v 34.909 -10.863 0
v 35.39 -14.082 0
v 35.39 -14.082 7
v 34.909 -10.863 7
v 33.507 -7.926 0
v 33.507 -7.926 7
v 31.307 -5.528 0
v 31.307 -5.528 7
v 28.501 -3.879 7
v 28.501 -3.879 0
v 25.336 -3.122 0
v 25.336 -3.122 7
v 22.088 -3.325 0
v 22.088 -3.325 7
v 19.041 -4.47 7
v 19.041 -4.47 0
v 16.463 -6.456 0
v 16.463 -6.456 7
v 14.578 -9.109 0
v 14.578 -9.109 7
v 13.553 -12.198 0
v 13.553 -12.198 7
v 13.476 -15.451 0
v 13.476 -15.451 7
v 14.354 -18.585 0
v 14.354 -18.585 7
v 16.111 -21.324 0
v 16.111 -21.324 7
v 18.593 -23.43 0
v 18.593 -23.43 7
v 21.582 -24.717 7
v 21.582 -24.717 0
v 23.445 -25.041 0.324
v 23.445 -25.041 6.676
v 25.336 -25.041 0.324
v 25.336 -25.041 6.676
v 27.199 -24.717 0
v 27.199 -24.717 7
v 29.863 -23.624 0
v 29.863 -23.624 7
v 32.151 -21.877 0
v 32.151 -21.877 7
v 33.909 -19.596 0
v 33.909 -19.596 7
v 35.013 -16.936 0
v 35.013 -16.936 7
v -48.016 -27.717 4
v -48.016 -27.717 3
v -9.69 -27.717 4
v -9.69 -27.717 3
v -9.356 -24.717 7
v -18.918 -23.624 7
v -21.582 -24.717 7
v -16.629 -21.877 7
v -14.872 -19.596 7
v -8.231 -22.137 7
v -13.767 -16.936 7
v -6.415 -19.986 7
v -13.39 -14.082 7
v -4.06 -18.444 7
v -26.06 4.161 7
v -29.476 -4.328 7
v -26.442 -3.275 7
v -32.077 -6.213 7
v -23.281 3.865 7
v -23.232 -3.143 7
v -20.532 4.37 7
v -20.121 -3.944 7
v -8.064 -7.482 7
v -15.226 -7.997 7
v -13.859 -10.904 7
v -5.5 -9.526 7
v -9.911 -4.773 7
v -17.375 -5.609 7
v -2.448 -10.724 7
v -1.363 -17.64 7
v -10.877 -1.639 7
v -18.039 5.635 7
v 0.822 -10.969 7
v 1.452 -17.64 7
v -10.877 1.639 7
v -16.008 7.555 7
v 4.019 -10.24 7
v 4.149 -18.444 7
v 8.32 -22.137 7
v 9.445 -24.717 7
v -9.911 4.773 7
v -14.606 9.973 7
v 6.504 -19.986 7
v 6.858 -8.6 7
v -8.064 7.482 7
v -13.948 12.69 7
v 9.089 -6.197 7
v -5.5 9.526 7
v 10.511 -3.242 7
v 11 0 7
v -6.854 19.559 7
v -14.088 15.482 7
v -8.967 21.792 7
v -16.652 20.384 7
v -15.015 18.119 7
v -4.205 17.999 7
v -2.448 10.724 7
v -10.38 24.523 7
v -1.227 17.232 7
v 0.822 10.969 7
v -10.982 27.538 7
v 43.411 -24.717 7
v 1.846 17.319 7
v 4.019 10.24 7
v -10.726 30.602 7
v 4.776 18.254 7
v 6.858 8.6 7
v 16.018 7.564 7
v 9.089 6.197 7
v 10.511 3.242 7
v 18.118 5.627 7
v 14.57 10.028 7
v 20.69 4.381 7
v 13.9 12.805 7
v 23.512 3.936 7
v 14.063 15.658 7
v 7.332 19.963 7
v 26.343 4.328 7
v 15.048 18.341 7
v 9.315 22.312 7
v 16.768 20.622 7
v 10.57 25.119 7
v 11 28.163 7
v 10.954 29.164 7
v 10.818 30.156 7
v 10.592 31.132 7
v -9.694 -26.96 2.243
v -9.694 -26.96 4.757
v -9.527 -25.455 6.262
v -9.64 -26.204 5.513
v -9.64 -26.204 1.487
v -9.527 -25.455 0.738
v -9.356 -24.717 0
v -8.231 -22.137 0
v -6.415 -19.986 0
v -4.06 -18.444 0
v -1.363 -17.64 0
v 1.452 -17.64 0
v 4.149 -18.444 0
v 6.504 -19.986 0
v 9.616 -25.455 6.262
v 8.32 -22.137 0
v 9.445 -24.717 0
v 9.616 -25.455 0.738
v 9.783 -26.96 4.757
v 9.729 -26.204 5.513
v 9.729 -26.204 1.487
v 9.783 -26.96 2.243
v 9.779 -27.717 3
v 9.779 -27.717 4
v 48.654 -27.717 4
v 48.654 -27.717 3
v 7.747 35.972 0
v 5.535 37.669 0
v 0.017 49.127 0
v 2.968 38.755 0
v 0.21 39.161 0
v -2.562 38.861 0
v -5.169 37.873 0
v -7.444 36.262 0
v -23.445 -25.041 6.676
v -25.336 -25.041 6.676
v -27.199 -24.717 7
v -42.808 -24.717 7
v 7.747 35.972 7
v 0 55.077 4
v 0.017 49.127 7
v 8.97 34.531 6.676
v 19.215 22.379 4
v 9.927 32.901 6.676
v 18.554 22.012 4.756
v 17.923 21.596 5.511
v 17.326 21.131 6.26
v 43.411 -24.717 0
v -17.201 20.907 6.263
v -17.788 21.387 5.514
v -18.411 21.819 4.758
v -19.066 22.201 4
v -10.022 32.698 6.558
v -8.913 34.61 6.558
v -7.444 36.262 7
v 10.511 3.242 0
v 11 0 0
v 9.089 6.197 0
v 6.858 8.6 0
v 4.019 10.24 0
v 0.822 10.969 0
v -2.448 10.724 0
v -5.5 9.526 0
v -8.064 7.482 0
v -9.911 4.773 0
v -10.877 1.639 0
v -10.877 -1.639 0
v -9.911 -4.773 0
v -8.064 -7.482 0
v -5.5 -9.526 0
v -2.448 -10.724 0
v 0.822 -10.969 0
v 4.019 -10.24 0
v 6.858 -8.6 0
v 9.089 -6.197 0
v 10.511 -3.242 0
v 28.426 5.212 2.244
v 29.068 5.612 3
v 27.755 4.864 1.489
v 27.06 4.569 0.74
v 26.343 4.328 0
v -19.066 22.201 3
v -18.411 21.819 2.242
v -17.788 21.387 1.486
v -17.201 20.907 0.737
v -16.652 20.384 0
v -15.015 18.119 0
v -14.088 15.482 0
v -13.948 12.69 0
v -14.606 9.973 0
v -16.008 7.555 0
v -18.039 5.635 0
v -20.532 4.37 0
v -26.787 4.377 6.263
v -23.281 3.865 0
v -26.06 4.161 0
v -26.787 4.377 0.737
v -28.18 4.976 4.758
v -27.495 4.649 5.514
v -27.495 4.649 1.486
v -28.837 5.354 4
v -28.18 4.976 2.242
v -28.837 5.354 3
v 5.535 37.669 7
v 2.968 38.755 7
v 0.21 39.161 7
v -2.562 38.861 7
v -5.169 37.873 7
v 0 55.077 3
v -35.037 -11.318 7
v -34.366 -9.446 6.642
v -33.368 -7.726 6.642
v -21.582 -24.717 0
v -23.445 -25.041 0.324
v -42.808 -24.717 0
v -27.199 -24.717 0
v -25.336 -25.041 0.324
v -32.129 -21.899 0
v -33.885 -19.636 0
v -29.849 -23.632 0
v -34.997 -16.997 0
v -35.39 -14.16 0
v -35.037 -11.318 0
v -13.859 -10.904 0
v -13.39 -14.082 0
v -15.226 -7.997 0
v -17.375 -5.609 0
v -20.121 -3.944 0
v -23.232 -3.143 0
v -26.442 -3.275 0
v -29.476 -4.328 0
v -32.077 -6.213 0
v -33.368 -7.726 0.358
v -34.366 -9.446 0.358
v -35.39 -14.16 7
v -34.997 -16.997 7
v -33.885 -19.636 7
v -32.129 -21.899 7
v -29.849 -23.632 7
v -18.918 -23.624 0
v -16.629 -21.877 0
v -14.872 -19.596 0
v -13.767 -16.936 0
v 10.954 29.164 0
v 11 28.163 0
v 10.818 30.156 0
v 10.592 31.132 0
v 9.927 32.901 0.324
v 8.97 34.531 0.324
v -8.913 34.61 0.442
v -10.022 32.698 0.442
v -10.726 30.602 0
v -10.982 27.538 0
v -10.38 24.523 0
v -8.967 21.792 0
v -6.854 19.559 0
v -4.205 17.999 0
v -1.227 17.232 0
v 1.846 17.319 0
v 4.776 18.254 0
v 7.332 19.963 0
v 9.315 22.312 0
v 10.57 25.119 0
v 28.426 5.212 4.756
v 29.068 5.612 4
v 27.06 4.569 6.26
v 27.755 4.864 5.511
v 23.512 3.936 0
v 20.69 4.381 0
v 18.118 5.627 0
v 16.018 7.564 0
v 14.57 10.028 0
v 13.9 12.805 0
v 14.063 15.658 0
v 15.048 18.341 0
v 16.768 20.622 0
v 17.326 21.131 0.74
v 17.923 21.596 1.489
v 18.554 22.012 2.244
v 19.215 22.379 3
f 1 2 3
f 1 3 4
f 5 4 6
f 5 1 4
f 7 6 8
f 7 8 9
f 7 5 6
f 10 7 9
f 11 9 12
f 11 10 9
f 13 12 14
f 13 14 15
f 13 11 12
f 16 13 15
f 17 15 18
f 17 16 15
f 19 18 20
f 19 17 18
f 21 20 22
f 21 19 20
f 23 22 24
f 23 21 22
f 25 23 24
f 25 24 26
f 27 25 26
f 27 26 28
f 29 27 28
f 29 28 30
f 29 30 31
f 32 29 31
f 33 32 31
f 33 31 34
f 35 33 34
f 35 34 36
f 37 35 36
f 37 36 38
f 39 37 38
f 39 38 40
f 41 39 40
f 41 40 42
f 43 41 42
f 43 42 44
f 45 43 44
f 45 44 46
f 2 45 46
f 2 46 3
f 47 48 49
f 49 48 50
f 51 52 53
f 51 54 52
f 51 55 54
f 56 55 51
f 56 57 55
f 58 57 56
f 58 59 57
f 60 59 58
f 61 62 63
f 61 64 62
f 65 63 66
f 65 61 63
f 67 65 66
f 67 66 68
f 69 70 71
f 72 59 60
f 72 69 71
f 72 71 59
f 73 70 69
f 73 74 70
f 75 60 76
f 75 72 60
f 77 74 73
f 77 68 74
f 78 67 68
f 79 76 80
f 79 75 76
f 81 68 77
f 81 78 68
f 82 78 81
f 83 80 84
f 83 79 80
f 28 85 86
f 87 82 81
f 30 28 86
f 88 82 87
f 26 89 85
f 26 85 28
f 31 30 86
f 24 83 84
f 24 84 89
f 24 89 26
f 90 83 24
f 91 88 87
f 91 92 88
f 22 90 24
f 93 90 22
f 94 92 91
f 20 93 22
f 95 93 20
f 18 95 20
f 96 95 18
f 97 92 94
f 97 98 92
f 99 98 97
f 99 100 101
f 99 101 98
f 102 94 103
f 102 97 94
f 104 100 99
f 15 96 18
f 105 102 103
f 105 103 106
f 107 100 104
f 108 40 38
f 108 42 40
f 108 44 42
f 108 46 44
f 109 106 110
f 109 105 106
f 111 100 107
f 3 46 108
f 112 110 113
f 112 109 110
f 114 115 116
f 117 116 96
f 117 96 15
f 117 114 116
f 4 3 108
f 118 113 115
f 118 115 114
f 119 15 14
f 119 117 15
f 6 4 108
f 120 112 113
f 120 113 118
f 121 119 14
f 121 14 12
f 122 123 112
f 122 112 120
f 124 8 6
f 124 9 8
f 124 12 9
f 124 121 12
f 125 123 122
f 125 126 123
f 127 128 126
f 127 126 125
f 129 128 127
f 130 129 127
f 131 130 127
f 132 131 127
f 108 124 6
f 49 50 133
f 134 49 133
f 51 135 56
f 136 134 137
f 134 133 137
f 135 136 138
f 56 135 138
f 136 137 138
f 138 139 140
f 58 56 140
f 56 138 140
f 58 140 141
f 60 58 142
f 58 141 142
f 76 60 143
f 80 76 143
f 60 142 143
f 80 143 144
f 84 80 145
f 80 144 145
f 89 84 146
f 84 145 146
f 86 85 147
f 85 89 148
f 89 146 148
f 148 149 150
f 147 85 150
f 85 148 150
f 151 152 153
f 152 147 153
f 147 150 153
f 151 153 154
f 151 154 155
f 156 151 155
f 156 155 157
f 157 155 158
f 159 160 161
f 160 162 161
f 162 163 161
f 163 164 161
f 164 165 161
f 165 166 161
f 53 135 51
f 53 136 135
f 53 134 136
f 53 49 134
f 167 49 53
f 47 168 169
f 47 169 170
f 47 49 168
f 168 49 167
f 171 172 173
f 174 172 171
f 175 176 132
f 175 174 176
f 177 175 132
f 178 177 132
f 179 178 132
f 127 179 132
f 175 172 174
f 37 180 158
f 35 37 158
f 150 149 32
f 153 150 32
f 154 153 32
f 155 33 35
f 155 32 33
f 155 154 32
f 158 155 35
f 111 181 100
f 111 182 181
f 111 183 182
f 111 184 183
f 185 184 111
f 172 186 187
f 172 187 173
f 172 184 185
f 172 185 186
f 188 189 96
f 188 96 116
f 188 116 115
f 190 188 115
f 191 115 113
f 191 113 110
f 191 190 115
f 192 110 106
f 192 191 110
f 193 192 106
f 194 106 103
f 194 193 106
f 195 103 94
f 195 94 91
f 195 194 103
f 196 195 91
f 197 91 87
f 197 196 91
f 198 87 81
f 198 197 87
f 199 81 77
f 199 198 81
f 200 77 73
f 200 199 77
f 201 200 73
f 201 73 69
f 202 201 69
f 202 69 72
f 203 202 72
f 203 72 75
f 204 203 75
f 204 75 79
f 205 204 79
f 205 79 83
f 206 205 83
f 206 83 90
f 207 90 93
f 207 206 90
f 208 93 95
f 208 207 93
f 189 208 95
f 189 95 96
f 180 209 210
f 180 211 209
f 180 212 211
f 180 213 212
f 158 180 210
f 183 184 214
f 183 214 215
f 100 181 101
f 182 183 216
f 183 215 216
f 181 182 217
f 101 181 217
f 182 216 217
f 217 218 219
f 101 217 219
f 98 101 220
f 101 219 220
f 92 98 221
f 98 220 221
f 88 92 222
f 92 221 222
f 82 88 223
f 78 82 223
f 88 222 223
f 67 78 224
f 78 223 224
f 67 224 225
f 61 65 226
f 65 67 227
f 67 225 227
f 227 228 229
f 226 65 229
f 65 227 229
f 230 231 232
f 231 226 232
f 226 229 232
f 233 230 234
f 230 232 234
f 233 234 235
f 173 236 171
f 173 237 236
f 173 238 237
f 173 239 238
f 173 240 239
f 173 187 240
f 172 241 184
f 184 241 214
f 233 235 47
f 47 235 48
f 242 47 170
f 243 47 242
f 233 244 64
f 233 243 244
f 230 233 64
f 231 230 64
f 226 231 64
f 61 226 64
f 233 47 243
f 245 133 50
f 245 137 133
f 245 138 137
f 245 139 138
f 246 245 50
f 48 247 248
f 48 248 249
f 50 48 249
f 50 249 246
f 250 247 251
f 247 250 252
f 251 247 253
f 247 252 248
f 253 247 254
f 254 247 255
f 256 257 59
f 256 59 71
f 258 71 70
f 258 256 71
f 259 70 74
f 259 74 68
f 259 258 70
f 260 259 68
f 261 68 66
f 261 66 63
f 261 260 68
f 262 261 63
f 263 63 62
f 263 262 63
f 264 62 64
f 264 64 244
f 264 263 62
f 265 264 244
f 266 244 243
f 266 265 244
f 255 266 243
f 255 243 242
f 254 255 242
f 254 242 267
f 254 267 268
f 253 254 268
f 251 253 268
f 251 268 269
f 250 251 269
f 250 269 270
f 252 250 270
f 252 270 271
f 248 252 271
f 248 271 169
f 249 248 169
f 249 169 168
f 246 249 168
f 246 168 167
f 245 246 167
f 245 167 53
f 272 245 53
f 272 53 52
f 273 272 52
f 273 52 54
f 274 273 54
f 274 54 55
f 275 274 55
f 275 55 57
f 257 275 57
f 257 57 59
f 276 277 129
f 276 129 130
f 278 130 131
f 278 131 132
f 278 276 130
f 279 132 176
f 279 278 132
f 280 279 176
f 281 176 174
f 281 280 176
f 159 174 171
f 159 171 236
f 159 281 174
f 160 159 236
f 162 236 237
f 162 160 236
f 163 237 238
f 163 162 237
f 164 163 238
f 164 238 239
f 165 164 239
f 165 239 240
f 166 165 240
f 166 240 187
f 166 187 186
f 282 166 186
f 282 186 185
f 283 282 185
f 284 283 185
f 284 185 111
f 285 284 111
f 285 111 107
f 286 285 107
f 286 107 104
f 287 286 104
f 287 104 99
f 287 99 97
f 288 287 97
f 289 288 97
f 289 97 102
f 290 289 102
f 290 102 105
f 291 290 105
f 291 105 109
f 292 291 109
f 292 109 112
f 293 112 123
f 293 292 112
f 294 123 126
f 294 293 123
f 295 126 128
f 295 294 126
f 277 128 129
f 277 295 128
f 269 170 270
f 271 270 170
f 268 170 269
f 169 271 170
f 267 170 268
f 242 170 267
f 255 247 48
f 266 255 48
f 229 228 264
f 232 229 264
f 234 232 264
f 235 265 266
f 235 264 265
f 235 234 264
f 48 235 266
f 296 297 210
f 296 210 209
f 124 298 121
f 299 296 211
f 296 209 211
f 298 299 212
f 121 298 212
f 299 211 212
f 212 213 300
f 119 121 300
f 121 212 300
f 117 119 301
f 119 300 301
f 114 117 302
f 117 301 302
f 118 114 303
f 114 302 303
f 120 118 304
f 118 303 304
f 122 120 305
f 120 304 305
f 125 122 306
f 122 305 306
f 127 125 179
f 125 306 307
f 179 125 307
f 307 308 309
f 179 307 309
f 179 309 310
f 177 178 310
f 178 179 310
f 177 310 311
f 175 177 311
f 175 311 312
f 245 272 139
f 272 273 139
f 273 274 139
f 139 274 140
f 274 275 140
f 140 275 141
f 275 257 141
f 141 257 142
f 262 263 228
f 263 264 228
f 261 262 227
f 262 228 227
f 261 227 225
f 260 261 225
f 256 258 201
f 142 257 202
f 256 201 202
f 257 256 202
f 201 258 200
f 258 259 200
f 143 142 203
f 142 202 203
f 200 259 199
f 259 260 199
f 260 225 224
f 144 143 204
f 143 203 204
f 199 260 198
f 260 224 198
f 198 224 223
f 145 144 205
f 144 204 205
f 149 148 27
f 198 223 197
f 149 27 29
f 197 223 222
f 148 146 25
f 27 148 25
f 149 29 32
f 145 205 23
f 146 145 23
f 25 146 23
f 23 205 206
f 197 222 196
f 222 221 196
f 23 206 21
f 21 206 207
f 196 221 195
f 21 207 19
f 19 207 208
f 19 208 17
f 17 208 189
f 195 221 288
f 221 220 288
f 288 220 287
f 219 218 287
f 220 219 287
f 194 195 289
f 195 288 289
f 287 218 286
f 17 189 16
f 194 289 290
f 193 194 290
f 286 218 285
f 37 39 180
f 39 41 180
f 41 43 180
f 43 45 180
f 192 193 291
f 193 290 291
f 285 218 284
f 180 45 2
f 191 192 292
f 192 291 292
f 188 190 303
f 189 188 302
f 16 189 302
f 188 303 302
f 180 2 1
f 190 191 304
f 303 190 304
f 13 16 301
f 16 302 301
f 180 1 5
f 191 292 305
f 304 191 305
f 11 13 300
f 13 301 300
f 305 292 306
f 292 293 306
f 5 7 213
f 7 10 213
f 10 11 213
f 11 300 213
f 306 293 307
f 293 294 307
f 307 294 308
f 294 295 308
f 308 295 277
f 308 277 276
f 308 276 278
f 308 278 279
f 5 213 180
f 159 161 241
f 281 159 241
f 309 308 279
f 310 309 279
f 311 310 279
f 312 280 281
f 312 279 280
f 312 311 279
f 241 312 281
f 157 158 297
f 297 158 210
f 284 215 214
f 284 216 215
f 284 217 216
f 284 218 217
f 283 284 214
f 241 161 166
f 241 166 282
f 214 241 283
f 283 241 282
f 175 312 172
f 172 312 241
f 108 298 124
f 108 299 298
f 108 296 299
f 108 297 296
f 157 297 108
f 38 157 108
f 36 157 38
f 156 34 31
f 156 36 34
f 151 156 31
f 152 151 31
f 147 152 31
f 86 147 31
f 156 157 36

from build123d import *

# Parameters (mm, degrees)
F0_R         = 11
F1_DEPTH     = 7
F2_T1_DEPTH  = 53.4348218988
F2_T3_DEPTH  = 53.3566125342
F2_T5_DEPTH  = 53.6604130231
F2_T7_DEPTH  = 53.7564599562
F2_T9_DEPTH  = 54.3050348939
F2_T11_DEPTH = 54.0874720662
F3_T1_DEPTH  = 53.4348218988
F3_T3_DEPTH  = 53.6604130231
F3_T5_DEPTH  = 53.7564599562
F3_T7_DEPTH  = 54.3050348939
F3_T9_DEPTH  = 54.0874720662
F3_T11_DEPTH = 53.3566125342


# Not quite as in the source:
# - a fillet or chamfer that OpenCascade refuses, or shapes differently, is made with other operations: its cross-section is extruded or revolved along the edge and cut away or added


with BuildPart() as f1:
    # F0 (on Top) → F1 (new body)
    with BuildSketch(Plane.XY):
        with BuildLine():
            Line((19.2151323873, 22.3788071315), (0, 55.077418685))
            Line((0, 55.077418685), (-19.066227053, 22.2013174855))
            ThreePointArc((-19.066227053, 22.2013174855), (-15.2197508504, 8.7138440156), (-28.8366321548, 5.35410246))
            Line((-28.8366321548, 5.35410246), (-48.0160338648, -27.7171470225))
            Line((-48.0160338648, -27.7171470225), (-9.6896718364, -27.7171470225))
            ThreePointArc((-9.6896718364, -27.7171470225), (0.0445471902, -17.5375945189), (9.7787662169, -27.7171470225))
            Line((9.7787662169, -27.7171470225), (48.6537031829, -27.7171470225))
            Line((48.6537031829, -27.7171470225), (29.0682872932, 5.6115802214))
            ThreePointArc((29.0682872932, 5.6115802214), (15.2034219667, 8.7426653076), (19.2151323873, 22.3788071315))
        make_face()
        with Locations((-24.3902284877, -14.0817042541)):
            Circle(F0_R, mode=Mode.SUBTRACT)
        Circle(F0_R, mode=Mode.SUBTRACT)
        with Locations((24.3902285123, -14.0817042399)):
            Circle(F0_R, mode=Mode.SUBTRACT)
        with Locations((0, 28.1634107232)):
            Circle(F0_R, mode=Mode.SUBTRACT)
    extrude(amount=F1_DEPTH)

    # F2: chamfer of 3 on 6 edges, made by hand

    # F2_s2 → F2_t1 (cut)
    with BuildSketch(Plane(origin=(27.7729977796, 47.8892799857, 0), x_dir=(0, 0, 1), z_dir=(-0.5016804508, -0.8650530188, 0))):
        Polygon((4, 27.6312642329), (7, 24.6312642329), (7, 27.6312642329), align=None)
    extrude(amount=F2_T1_DEPTH, mode=Mode.SUBTRACT)

    # F2_s4 → F2_t3 (cut)
    with BuildSketch(Plane(origin=(-0.9341553956, 1.5896629696, 0), x_dir=(0, 0, 1), z_dir=(-0.5066411345, 0.8621570396, 0))):
        Polygon((4, 27.9044858871), (7, 24.9044858871), (7, 27.9044858871), align=None)
    extrude(amount=F2_T3_DEPTH, mode=Mode.SUBTRACT)

    # F2_s6 → F2_t5 (cut)
    with BuildSketch(Plane(origin=(-1.0636343753, -1.8340362392, 0), x_dir=(0, 0, 1), z_dir=(-0.5016804508, -0.8650530188, 0))):
        Polygon((4, 27.6312642329), (7, 24.6312642329), (7, 27.6312642329), align=None)
    extrude(amount=F2_T5_DEPTH, mode=Mode.SUBTRACT)

    # F2_s8 → F2_t7 (cut)
    with BuildSketch(Plane.YZ.offset(-55.7310828287)):
        Polygon((-27.7171470225, 4), (-24.7171470225, 7), (-27.7171470225, 7), align=None)
    extrude(amount=F2_T7_DEPTH, mode=Mode.SUBTRACT)

    # F2_s10 → F2_t9 (cut)
    with BuildSketch(Plane.YZ.offset(2.063717253)):
        Polygon((-27.7171470225, 4), (-24.7171470225, 7), (-27.7171470225, 7), align=None)
    extrude(amount=F2_T9_DEPTH, mode=Mode.SUBTRACT)

    # F2_s12 → F2_t11 (cut)
    with BuildSketch(Plane(origin=(28.5044154, -48.5062911843, 0), x_dir=(0, 0, 1), z_dir=(-0.5066411345, 0.8621570396, 0))):
        Polygon((4, 27.9044858871), (7, 24.9044858871), (7, 27.9044858871), align=None)
    extrude(amount=F2_T11_DEPTH, mode=Mode.SUBTRACT)

    # F3: chamfer of 3 on 6 edges, made by hand

    # F3_s2 → F3_t1 (cut)
    with BuildSketch(Plane(origin=(27.7729977796, 47.8892799857, 0), x_dir=(0, 0, 1), z_dir=(-0.5016804508, -0.8650530188, 0))):
        Polygon((0, 24.6312642329), (3, 27.6312642329), (0, 27.6312642329), align=None)
    extrude(amount=F3_T1_DEPTH, mode=Mode.SUBTRACT)

    # F3_s4 → F3_t3 (cut)
    with BuildSketch(Plane(origin=(-1.0636343753, -1.8340362392, 0), x_dir=(0, 0, 1), z_dir=(-0.5016804508, -0.8650530188, 0))):
        Polygon((0, 24.6312642329), (3, 27.6312642329), (0, 27.6312642329), align=None)
    extrude(amount=F3_T3_DEPTH, mode=Mode.SUBTRACT)

    # F3_s6 → F3_t5 (cut)
    with BuildSketch(Plane.YZ.offset(-55.7310828287)):
        Polygon((-24.7171470225, 0), (-27.7171470225, 3), (-27.7171470225, 0), align=None)
    extrude(amount=F3_T5_DEPTH, mode=Mode.SUBTRACT)

    # F3_s8 → F3_t7 (cut)
    with BuildSketch(Plane.YZ.offset(2.063717253)):
        Polygon((-24.7171470225, 0), (-27.7171470225, 3), (-27.7171470225, 0), align=None)
    extrude(amount=F3_T7_DEPTH, mode=Mode.SUBTRACT)

    # F3_s10 → F3_t9 (cut)
    with BuildSketch(Plane(origin=(28.5044154, -48.5062911843, 0), x_dir=(0, 0, 1), z_dir=(-0.5066411345, 0.8621570396, 0))):
        Polygon((0, 24.9044858871), (3, 27.9044858871), (0, 27.9044858871), align=None)
    extrude(amount=F3_T9_DEPTH, mode=Mode.SUBTRACT)

    # F3_s12 → F3_t11 (cut)
    with BuildSketch(Plane(origin=(-0.9341553956, 1.5896629696, 0), x_dir=(0, 0, 1), z_dir=(-0.5066411345, 0.8621570396, 0))):
        Polygon((0, 24.9044858871), (3, 27.9044858871), (0, 27.9044858871), align=None)
    extrude(amount=F3_T11_DEPTH, mode=Mode.SUBTRACT)


solid = f1.part
